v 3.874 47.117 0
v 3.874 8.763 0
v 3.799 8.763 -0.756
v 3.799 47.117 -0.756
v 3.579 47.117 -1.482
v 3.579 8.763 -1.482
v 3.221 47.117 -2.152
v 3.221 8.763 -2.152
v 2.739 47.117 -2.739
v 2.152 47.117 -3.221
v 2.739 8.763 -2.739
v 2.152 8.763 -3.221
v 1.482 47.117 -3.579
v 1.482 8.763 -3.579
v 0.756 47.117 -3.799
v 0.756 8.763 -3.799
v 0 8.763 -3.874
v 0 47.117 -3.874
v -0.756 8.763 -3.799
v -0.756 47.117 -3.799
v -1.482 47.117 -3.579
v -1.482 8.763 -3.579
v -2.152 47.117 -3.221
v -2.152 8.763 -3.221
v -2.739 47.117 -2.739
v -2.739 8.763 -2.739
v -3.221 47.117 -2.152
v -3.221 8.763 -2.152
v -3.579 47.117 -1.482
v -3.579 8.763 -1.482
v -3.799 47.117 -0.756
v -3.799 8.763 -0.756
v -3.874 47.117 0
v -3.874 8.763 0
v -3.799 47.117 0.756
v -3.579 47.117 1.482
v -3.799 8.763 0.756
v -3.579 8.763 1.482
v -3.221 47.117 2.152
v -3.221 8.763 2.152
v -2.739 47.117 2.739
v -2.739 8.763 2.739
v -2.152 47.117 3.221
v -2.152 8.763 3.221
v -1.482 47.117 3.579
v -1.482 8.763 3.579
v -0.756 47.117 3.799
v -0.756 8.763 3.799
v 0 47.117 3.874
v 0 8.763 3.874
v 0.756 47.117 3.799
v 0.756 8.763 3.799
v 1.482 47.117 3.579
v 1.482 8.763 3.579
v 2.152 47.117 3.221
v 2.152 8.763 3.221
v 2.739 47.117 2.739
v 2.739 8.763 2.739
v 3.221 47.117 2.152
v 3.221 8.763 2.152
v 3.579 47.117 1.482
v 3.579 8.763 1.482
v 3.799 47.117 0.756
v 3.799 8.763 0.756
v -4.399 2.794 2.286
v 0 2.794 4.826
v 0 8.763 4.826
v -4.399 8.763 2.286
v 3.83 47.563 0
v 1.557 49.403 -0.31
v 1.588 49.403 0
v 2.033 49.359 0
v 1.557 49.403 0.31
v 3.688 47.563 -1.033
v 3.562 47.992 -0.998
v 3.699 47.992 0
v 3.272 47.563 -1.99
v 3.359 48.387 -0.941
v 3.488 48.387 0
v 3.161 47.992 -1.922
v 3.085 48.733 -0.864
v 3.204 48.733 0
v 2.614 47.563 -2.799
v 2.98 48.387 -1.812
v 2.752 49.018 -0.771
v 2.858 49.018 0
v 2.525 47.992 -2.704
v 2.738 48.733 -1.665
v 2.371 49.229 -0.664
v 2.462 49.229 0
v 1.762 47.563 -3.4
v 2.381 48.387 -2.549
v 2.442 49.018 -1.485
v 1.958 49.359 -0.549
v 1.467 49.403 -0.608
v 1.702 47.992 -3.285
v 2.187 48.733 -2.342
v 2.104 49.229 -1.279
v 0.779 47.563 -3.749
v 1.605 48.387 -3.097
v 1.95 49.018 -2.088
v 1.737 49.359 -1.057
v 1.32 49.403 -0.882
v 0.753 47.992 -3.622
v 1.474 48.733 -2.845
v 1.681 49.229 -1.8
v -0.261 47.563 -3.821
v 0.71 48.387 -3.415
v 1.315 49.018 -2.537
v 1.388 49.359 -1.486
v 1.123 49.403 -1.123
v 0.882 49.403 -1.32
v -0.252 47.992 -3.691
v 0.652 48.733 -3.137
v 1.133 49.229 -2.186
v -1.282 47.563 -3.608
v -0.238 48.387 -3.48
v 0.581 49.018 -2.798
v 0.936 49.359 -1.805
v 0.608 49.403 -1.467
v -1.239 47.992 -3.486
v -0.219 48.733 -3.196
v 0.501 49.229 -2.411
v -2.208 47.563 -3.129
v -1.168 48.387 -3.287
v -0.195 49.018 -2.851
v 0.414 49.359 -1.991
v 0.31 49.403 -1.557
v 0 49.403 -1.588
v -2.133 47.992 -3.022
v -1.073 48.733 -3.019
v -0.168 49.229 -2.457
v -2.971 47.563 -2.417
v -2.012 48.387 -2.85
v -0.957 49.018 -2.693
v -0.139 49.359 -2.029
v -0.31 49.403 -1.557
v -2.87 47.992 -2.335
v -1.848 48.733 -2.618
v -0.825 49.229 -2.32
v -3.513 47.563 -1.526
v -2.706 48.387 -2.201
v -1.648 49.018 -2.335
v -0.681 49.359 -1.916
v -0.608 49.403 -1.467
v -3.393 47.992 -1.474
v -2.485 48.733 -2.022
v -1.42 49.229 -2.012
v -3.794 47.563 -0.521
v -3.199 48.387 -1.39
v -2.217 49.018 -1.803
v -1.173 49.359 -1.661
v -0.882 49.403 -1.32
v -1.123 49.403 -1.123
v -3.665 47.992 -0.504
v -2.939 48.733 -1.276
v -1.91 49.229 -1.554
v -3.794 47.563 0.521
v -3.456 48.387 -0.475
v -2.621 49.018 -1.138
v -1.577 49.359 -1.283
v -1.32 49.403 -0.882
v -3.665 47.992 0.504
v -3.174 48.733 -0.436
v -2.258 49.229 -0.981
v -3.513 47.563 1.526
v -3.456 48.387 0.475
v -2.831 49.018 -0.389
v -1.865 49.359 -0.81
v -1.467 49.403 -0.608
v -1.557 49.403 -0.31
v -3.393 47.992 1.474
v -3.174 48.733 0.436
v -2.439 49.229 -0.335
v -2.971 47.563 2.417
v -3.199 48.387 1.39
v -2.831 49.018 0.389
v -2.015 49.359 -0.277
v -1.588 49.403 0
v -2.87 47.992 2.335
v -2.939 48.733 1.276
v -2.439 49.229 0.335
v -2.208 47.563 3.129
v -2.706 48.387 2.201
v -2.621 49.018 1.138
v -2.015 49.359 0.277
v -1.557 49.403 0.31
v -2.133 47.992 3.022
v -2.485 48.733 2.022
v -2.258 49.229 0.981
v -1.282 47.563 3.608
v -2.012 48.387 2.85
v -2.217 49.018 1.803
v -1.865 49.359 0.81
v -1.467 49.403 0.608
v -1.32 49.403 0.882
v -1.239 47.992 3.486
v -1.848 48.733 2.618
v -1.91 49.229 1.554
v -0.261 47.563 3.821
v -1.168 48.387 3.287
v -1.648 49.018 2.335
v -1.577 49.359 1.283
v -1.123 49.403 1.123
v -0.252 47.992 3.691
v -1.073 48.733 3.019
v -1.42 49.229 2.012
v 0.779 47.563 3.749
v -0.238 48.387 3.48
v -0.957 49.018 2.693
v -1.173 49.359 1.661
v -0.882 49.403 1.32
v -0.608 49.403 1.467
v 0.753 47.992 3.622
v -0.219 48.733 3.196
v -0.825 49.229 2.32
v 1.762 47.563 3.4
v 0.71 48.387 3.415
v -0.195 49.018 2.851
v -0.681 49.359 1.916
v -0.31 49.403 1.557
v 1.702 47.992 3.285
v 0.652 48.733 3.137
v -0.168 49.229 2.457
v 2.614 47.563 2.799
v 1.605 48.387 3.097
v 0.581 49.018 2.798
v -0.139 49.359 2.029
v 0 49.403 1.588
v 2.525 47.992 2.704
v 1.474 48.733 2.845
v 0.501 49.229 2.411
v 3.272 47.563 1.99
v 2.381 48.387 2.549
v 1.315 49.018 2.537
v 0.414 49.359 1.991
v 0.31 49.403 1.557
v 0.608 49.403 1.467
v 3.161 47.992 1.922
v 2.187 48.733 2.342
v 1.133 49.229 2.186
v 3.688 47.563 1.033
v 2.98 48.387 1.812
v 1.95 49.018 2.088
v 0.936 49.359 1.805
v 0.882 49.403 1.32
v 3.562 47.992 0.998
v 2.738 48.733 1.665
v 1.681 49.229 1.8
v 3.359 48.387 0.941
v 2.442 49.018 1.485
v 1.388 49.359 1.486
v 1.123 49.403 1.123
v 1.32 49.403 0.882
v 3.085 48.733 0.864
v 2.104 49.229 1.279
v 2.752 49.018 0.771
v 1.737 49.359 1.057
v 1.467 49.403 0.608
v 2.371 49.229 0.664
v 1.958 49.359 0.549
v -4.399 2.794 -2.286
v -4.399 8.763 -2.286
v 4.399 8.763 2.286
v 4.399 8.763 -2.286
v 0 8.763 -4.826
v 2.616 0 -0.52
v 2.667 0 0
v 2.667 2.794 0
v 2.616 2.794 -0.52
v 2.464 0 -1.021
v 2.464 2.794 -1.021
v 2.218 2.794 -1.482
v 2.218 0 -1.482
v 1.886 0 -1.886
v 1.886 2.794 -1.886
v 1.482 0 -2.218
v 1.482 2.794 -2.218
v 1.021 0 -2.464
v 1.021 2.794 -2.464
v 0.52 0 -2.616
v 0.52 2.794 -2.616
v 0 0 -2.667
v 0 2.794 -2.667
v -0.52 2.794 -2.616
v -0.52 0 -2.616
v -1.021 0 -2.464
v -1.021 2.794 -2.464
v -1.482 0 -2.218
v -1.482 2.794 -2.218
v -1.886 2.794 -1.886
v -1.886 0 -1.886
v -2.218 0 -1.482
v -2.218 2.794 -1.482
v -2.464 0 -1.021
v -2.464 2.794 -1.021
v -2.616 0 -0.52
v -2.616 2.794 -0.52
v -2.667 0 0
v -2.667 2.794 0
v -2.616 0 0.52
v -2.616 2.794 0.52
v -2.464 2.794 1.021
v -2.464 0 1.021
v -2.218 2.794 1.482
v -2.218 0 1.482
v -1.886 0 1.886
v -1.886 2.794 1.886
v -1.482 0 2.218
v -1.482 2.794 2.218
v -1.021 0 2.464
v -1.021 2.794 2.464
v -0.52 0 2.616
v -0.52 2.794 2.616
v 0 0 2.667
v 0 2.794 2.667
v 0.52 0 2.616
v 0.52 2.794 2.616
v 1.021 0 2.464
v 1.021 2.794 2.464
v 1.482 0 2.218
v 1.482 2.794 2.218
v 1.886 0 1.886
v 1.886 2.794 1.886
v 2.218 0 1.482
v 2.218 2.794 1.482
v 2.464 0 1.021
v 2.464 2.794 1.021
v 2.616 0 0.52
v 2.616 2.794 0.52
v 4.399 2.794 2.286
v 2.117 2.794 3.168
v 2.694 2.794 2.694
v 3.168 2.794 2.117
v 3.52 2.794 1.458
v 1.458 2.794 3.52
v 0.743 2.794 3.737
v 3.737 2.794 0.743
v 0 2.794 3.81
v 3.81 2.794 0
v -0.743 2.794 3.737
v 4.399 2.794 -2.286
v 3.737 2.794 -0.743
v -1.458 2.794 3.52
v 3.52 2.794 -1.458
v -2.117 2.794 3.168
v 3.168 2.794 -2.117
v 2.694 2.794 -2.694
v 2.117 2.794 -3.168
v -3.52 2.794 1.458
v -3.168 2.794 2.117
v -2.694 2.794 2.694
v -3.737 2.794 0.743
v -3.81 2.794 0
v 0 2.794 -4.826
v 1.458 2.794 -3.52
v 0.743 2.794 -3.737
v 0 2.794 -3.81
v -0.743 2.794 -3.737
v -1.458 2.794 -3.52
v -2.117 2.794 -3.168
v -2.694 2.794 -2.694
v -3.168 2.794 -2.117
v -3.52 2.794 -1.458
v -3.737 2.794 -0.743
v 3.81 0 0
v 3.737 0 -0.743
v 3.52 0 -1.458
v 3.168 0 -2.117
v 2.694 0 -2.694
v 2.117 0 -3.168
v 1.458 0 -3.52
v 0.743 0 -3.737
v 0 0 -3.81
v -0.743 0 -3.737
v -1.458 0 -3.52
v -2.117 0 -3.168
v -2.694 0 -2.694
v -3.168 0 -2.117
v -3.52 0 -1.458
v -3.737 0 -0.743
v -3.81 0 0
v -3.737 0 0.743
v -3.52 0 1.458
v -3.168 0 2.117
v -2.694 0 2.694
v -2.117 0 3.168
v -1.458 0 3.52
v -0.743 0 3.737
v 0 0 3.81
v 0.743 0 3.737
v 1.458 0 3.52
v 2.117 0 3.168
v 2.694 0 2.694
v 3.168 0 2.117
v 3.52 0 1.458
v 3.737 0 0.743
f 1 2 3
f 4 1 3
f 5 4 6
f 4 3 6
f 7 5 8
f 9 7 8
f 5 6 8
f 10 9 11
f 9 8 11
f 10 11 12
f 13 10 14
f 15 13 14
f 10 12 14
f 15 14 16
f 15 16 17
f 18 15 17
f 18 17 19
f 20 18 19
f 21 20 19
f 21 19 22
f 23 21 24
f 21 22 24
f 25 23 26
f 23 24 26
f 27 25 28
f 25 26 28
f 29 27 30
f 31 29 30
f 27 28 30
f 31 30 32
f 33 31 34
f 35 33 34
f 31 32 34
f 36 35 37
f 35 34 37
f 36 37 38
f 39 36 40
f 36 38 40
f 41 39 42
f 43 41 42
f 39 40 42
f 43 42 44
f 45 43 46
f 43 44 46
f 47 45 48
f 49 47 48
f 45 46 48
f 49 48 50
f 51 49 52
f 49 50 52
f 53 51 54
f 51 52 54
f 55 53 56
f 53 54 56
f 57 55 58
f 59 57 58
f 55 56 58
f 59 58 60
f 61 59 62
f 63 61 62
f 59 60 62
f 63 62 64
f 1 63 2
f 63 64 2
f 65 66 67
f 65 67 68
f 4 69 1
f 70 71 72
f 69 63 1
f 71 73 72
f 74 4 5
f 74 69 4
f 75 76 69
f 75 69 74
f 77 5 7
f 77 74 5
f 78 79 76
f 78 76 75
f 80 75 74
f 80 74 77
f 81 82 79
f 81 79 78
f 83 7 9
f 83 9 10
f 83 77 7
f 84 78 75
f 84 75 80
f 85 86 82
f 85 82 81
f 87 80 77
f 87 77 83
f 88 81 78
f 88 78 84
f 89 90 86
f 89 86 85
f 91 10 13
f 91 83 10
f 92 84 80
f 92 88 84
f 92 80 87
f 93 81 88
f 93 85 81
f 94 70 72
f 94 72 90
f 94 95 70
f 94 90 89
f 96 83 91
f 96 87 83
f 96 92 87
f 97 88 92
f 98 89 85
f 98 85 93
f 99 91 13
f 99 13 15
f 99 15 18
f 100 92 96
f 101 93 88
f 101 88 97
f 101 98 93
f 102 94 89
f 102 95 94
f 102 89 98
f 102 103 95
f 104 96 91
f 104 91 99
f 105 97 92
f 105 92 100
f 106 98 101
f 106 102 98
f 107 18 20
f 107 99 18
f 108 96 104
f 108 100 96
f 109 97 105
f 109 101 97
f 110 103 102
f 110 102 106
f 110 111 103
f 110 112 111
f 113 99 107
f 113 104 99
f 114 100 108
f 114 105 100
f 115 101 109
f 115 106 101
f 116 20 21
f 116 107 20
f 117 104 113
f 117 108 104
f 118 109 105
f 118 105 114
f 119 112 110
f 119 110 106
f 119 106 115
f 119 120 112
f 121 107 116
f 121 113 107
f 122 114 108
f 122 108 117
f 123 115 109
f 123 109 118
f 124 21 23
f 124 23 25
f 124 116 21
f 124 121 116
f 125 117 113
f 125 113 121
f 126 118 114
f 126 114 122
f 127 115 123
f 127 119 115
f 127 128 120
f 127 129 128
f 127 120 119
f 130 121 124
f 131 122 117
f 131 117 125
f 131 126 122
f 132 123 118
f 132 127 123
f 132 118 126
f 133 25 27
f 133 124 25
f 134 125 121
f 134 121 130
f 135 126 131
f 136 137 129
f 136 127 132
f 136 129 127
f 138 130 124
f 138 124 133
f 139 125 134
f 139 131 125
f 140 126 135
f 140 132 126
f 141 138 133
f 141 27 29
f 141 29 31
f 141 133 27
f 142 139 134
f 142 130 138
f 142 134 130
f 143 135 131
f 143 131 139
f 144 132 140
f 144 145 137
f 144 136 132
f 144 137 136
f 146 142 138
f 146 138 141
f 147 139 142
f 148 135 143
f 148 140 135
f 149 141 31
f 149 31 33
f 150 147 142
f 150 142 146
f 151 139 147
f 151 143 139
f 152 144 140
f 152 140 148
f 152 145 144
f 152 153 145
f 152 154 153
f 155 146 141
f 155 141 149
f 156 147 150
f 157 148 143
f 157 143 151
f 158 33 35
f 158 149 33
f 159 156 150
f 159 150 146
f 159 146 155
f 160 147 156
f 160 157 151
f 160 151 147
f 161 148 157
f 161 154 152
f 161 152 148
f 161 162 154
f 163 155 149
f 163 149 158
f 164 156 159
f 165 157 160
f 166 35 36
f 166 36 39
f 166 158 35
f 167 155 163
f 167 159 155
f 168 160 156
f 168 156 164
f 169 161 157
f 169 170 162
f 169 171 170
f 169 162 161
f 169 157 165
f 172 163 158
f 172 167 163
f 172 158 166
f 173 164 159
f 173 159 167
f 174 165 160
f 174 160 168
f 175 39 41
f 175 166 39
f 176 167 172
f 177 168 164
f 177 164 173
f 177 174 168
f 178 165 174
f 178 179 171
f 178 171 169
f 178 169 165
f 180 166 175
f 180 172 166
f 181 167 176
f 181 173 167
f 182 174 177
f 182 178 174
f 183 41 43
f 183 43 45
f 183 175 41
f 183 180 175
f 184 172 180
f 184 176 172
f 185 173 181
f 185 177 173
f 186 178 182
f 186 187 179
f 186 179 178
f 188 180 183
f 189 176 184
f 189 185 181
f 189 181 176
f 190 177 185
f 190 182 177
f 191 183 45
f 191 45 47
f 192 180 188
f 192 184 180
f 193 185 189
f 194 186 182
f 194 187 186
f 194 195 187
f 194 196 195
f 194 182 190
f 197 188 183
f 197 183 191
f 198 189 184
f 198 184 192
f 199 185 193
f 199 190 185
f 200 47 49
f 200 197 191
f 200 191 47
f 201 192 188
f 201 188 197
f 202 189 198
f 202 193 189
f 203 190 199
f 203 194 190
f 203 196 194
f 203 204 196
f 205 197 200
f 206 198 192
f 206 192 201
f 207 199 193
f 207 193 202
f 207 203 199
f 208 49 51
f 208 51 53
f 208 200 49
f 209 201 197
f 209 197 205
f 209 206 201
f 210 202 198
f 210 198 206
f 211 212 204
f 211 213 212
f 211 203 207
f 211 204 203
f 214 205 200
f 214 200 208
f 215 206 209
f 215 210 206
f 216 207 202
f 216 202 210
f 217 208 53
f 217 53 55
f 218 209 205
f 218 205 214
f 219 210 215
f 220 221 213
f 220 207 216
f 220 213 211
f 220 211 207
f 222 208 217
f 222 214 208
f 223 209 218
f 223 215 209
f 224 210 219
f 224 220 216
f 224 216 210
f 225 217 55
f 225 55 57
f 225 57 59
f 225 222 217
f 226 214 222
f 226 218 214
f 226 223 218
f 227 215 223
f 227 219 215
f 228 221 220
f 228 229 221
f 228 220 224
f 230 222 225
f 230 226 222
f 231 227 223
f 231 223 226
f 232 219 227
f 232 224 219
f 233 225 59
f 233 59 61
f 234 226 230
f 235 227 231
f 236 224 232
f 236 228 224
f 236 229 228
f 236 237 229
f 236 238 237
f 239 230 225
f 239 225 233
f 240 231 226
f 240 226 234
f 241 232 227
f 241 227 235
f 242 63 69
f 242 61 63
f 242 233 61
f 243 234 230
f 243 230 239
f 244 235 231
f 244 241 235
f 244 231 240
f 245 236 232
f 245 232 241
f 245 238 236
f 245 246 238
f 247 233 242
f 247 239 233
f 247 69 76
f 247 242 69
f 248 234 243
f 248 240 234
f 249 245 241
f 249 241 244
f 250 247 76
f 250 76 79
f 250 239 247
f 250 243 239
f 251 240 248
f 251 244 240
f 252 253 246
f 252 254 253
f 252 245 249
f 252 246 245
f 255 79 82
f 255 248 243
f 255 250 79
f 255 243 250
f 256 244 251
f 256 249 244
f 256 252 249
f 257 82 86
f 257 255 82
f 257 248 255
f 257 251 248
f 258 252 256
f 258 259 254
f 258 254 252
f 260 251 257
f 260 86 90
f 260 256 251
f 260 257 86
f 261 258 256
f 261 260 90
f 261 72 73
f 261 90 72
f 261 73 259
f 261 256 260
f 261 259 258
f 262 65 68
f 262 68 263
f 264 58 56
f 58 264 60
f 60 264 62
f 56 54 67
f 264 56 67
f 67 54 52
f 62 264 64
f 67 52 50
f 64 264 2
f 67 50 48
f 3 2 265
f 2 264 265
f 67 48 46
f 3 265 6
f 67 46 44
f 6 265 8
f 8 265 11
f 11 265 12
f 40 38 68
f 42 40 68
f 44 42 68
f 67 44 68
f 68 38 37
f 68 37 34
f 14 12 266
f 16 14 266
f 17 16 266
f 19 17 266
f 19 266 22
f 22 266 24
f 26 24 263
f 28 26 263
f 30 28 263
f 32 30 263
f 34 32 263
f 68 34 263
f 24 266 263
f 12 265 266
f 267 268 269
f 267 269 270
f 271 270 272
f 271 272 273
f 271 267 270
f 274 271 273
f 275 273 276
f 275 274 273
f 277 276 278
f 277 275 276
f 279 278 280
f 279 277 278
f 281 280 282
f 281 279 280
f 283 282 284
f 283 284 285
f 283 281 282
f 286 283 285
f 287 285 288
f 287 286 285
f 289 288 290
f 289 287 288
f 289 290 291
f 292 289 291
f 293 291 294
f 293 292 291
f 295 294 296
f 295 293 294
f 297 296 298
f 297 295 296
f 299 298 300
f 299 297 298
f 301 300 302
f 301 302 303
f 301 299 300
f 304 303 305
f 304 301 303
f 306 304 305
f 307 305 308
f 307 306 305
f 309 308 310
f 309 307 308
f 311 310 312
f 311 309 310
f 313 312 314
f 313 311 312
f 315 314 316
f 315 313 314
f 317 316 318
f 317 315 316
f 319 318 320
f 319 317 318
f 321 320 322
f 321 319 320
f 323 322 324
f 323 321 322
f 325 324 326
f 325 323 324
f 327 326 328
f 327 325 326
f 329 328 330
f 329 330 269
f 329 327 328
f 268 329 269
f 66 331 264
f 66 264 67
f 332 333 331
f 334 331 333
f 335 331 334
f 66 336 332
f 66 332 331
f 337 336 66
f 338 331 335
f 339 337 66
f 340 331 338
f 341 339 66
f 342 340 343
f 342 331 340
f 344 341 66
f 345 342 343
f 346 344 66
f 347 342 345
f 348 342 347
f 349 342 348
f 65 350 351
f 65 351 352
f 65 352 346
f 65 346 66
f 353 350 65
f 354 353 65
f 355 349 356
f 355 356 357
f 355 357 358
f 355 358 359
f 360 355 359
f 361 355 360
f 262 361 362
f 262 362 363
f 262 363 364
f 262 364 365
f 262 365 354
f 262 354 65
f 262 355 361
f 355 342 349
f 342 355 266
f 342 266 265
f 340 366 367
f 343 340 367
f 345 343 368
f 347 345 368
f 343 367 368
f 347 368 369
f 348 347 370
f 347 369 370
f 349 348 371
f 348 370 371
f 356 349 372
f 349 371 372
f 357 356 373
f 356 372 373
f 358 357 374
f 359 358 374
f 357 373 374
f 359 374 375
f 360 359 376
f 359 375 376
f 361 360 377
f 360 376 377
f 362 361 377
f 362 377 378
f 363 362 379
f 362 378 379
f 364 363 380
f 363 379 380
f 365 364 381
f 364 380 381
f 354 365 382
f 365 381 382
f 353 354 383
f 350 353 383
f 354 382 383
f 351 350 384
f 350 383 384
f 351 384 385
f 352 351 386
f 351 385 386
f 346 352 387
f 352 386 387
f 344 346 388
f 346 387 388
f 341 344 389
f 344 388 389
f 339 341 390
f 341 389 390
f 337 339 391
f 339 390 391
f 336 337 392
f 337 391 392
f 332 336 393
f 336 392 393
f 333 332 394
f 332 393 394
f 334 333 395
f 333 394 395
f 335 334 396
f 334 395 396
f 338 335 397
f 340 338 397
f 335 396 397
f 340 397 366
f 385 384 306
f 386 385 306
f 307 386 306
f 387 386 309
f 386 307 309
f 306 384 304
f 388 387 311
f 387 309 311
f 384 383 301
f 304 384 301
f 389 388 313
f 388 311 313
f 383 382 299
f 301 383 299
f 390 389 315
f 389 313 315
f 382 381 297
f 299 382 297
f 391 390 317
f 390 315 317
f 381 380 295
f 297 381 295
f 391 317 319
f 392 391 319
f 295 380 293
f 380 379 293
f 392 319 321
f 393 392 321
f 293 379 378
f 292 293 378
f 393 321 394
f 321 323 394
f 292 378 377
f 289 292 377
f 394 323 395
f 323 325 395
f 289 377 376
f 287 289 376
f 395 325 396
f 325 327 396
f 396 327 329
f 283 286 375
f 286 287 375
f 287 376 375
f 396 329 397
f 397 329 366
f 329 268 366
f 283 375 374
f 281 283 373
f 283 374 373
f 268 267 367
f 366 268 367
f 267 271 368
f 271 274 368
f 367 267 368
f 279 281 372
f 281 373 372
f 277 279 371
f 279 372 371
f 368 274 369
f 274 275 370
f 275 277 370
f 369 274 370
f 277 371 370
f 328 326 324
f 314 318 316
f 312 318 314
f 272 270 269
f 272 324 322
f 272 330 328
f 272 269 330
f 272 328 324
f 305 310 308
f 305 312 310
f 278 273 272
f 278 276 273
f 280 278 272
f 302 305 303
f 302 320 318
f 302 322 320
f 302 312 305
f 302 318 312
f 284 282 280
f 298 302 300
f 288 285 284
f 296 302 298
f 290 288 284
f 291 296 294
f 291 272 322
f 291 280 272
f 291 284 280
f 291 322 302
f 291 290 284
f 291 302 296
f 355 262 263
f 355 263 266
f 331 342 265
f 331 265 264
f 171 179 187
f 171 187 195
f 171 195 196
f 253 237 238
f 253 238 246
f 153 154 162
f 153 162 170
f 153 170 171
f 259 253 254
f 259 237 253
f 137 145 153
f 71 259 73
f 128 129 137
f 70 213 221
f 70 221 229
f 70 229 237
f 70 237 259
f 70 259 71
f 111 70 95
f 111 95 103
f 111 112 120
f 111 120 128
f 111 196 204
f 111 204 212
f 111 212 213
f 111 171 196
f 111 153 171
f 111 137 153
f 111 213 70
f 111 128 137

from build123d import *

# Parameters (mm, degrees)
SKETCH1_R           = 3.81
SKETCH1_R_2         = 2.667
BOSS_EXTRUDE1_DEPTH = 2.794
BOSS_EXTRUDE2_DEPTH = 5.969
SKETCH4_R           = 3.8735
BOSS_EXTRUDE3_DEPTH = 40.64
FILLET1_R           = 2.286


with BuildPart() as part:
    # Sketch1 → Boss-Extrude1 (new body)
    with BuildSketch(Plane(origin=(0, 0, 0), x_dir=(1, 0, 0), z_dir=(0, 1, 0))):
        Circle(SKETCH1_R)
        Circle(SKETCH1_R_2, mode=Mode.SUBTRACT)
    extrude(amount=BOSS_EXTRUDE1_DEPTH)

    # Sketch3 → Boss-Extrude2 (add)
    with BuildSketch(Plane(origin=(0, 2.794, 0), x_dir=(1, 0, 0), z_dir=(0, 1, 0))):
        Polygon((-4.399409051, -2.286), (-4.399409051, 2.286), (0, 4.826), (4.399409051, 2.286), (4.399409051, -2.286), (0, -4.826), align=None)
    extrude(amount=BOSS_EXTRUDE2_DEPTH)

    # Sketch4 → Boss-Extrude3 (add)
    with BuildSketch(Plane(origin=(0, 8.763, 0), x_dir=(1, 0, 0), z_dir=(0, 1, 0))):
        Circle(SKETCH4_R)
    extrude(amount=BOSS_EXTRUDE3_DEPTH)

    # Fillet1
    fillet1_edges = [part.edges().sort_by_distance(p)[0] for p in [
        (-3.8735, 49.403, 0),
    ]]
    fillet(fillet1_edges, radius=FILLET1_R)


solid = part.part
